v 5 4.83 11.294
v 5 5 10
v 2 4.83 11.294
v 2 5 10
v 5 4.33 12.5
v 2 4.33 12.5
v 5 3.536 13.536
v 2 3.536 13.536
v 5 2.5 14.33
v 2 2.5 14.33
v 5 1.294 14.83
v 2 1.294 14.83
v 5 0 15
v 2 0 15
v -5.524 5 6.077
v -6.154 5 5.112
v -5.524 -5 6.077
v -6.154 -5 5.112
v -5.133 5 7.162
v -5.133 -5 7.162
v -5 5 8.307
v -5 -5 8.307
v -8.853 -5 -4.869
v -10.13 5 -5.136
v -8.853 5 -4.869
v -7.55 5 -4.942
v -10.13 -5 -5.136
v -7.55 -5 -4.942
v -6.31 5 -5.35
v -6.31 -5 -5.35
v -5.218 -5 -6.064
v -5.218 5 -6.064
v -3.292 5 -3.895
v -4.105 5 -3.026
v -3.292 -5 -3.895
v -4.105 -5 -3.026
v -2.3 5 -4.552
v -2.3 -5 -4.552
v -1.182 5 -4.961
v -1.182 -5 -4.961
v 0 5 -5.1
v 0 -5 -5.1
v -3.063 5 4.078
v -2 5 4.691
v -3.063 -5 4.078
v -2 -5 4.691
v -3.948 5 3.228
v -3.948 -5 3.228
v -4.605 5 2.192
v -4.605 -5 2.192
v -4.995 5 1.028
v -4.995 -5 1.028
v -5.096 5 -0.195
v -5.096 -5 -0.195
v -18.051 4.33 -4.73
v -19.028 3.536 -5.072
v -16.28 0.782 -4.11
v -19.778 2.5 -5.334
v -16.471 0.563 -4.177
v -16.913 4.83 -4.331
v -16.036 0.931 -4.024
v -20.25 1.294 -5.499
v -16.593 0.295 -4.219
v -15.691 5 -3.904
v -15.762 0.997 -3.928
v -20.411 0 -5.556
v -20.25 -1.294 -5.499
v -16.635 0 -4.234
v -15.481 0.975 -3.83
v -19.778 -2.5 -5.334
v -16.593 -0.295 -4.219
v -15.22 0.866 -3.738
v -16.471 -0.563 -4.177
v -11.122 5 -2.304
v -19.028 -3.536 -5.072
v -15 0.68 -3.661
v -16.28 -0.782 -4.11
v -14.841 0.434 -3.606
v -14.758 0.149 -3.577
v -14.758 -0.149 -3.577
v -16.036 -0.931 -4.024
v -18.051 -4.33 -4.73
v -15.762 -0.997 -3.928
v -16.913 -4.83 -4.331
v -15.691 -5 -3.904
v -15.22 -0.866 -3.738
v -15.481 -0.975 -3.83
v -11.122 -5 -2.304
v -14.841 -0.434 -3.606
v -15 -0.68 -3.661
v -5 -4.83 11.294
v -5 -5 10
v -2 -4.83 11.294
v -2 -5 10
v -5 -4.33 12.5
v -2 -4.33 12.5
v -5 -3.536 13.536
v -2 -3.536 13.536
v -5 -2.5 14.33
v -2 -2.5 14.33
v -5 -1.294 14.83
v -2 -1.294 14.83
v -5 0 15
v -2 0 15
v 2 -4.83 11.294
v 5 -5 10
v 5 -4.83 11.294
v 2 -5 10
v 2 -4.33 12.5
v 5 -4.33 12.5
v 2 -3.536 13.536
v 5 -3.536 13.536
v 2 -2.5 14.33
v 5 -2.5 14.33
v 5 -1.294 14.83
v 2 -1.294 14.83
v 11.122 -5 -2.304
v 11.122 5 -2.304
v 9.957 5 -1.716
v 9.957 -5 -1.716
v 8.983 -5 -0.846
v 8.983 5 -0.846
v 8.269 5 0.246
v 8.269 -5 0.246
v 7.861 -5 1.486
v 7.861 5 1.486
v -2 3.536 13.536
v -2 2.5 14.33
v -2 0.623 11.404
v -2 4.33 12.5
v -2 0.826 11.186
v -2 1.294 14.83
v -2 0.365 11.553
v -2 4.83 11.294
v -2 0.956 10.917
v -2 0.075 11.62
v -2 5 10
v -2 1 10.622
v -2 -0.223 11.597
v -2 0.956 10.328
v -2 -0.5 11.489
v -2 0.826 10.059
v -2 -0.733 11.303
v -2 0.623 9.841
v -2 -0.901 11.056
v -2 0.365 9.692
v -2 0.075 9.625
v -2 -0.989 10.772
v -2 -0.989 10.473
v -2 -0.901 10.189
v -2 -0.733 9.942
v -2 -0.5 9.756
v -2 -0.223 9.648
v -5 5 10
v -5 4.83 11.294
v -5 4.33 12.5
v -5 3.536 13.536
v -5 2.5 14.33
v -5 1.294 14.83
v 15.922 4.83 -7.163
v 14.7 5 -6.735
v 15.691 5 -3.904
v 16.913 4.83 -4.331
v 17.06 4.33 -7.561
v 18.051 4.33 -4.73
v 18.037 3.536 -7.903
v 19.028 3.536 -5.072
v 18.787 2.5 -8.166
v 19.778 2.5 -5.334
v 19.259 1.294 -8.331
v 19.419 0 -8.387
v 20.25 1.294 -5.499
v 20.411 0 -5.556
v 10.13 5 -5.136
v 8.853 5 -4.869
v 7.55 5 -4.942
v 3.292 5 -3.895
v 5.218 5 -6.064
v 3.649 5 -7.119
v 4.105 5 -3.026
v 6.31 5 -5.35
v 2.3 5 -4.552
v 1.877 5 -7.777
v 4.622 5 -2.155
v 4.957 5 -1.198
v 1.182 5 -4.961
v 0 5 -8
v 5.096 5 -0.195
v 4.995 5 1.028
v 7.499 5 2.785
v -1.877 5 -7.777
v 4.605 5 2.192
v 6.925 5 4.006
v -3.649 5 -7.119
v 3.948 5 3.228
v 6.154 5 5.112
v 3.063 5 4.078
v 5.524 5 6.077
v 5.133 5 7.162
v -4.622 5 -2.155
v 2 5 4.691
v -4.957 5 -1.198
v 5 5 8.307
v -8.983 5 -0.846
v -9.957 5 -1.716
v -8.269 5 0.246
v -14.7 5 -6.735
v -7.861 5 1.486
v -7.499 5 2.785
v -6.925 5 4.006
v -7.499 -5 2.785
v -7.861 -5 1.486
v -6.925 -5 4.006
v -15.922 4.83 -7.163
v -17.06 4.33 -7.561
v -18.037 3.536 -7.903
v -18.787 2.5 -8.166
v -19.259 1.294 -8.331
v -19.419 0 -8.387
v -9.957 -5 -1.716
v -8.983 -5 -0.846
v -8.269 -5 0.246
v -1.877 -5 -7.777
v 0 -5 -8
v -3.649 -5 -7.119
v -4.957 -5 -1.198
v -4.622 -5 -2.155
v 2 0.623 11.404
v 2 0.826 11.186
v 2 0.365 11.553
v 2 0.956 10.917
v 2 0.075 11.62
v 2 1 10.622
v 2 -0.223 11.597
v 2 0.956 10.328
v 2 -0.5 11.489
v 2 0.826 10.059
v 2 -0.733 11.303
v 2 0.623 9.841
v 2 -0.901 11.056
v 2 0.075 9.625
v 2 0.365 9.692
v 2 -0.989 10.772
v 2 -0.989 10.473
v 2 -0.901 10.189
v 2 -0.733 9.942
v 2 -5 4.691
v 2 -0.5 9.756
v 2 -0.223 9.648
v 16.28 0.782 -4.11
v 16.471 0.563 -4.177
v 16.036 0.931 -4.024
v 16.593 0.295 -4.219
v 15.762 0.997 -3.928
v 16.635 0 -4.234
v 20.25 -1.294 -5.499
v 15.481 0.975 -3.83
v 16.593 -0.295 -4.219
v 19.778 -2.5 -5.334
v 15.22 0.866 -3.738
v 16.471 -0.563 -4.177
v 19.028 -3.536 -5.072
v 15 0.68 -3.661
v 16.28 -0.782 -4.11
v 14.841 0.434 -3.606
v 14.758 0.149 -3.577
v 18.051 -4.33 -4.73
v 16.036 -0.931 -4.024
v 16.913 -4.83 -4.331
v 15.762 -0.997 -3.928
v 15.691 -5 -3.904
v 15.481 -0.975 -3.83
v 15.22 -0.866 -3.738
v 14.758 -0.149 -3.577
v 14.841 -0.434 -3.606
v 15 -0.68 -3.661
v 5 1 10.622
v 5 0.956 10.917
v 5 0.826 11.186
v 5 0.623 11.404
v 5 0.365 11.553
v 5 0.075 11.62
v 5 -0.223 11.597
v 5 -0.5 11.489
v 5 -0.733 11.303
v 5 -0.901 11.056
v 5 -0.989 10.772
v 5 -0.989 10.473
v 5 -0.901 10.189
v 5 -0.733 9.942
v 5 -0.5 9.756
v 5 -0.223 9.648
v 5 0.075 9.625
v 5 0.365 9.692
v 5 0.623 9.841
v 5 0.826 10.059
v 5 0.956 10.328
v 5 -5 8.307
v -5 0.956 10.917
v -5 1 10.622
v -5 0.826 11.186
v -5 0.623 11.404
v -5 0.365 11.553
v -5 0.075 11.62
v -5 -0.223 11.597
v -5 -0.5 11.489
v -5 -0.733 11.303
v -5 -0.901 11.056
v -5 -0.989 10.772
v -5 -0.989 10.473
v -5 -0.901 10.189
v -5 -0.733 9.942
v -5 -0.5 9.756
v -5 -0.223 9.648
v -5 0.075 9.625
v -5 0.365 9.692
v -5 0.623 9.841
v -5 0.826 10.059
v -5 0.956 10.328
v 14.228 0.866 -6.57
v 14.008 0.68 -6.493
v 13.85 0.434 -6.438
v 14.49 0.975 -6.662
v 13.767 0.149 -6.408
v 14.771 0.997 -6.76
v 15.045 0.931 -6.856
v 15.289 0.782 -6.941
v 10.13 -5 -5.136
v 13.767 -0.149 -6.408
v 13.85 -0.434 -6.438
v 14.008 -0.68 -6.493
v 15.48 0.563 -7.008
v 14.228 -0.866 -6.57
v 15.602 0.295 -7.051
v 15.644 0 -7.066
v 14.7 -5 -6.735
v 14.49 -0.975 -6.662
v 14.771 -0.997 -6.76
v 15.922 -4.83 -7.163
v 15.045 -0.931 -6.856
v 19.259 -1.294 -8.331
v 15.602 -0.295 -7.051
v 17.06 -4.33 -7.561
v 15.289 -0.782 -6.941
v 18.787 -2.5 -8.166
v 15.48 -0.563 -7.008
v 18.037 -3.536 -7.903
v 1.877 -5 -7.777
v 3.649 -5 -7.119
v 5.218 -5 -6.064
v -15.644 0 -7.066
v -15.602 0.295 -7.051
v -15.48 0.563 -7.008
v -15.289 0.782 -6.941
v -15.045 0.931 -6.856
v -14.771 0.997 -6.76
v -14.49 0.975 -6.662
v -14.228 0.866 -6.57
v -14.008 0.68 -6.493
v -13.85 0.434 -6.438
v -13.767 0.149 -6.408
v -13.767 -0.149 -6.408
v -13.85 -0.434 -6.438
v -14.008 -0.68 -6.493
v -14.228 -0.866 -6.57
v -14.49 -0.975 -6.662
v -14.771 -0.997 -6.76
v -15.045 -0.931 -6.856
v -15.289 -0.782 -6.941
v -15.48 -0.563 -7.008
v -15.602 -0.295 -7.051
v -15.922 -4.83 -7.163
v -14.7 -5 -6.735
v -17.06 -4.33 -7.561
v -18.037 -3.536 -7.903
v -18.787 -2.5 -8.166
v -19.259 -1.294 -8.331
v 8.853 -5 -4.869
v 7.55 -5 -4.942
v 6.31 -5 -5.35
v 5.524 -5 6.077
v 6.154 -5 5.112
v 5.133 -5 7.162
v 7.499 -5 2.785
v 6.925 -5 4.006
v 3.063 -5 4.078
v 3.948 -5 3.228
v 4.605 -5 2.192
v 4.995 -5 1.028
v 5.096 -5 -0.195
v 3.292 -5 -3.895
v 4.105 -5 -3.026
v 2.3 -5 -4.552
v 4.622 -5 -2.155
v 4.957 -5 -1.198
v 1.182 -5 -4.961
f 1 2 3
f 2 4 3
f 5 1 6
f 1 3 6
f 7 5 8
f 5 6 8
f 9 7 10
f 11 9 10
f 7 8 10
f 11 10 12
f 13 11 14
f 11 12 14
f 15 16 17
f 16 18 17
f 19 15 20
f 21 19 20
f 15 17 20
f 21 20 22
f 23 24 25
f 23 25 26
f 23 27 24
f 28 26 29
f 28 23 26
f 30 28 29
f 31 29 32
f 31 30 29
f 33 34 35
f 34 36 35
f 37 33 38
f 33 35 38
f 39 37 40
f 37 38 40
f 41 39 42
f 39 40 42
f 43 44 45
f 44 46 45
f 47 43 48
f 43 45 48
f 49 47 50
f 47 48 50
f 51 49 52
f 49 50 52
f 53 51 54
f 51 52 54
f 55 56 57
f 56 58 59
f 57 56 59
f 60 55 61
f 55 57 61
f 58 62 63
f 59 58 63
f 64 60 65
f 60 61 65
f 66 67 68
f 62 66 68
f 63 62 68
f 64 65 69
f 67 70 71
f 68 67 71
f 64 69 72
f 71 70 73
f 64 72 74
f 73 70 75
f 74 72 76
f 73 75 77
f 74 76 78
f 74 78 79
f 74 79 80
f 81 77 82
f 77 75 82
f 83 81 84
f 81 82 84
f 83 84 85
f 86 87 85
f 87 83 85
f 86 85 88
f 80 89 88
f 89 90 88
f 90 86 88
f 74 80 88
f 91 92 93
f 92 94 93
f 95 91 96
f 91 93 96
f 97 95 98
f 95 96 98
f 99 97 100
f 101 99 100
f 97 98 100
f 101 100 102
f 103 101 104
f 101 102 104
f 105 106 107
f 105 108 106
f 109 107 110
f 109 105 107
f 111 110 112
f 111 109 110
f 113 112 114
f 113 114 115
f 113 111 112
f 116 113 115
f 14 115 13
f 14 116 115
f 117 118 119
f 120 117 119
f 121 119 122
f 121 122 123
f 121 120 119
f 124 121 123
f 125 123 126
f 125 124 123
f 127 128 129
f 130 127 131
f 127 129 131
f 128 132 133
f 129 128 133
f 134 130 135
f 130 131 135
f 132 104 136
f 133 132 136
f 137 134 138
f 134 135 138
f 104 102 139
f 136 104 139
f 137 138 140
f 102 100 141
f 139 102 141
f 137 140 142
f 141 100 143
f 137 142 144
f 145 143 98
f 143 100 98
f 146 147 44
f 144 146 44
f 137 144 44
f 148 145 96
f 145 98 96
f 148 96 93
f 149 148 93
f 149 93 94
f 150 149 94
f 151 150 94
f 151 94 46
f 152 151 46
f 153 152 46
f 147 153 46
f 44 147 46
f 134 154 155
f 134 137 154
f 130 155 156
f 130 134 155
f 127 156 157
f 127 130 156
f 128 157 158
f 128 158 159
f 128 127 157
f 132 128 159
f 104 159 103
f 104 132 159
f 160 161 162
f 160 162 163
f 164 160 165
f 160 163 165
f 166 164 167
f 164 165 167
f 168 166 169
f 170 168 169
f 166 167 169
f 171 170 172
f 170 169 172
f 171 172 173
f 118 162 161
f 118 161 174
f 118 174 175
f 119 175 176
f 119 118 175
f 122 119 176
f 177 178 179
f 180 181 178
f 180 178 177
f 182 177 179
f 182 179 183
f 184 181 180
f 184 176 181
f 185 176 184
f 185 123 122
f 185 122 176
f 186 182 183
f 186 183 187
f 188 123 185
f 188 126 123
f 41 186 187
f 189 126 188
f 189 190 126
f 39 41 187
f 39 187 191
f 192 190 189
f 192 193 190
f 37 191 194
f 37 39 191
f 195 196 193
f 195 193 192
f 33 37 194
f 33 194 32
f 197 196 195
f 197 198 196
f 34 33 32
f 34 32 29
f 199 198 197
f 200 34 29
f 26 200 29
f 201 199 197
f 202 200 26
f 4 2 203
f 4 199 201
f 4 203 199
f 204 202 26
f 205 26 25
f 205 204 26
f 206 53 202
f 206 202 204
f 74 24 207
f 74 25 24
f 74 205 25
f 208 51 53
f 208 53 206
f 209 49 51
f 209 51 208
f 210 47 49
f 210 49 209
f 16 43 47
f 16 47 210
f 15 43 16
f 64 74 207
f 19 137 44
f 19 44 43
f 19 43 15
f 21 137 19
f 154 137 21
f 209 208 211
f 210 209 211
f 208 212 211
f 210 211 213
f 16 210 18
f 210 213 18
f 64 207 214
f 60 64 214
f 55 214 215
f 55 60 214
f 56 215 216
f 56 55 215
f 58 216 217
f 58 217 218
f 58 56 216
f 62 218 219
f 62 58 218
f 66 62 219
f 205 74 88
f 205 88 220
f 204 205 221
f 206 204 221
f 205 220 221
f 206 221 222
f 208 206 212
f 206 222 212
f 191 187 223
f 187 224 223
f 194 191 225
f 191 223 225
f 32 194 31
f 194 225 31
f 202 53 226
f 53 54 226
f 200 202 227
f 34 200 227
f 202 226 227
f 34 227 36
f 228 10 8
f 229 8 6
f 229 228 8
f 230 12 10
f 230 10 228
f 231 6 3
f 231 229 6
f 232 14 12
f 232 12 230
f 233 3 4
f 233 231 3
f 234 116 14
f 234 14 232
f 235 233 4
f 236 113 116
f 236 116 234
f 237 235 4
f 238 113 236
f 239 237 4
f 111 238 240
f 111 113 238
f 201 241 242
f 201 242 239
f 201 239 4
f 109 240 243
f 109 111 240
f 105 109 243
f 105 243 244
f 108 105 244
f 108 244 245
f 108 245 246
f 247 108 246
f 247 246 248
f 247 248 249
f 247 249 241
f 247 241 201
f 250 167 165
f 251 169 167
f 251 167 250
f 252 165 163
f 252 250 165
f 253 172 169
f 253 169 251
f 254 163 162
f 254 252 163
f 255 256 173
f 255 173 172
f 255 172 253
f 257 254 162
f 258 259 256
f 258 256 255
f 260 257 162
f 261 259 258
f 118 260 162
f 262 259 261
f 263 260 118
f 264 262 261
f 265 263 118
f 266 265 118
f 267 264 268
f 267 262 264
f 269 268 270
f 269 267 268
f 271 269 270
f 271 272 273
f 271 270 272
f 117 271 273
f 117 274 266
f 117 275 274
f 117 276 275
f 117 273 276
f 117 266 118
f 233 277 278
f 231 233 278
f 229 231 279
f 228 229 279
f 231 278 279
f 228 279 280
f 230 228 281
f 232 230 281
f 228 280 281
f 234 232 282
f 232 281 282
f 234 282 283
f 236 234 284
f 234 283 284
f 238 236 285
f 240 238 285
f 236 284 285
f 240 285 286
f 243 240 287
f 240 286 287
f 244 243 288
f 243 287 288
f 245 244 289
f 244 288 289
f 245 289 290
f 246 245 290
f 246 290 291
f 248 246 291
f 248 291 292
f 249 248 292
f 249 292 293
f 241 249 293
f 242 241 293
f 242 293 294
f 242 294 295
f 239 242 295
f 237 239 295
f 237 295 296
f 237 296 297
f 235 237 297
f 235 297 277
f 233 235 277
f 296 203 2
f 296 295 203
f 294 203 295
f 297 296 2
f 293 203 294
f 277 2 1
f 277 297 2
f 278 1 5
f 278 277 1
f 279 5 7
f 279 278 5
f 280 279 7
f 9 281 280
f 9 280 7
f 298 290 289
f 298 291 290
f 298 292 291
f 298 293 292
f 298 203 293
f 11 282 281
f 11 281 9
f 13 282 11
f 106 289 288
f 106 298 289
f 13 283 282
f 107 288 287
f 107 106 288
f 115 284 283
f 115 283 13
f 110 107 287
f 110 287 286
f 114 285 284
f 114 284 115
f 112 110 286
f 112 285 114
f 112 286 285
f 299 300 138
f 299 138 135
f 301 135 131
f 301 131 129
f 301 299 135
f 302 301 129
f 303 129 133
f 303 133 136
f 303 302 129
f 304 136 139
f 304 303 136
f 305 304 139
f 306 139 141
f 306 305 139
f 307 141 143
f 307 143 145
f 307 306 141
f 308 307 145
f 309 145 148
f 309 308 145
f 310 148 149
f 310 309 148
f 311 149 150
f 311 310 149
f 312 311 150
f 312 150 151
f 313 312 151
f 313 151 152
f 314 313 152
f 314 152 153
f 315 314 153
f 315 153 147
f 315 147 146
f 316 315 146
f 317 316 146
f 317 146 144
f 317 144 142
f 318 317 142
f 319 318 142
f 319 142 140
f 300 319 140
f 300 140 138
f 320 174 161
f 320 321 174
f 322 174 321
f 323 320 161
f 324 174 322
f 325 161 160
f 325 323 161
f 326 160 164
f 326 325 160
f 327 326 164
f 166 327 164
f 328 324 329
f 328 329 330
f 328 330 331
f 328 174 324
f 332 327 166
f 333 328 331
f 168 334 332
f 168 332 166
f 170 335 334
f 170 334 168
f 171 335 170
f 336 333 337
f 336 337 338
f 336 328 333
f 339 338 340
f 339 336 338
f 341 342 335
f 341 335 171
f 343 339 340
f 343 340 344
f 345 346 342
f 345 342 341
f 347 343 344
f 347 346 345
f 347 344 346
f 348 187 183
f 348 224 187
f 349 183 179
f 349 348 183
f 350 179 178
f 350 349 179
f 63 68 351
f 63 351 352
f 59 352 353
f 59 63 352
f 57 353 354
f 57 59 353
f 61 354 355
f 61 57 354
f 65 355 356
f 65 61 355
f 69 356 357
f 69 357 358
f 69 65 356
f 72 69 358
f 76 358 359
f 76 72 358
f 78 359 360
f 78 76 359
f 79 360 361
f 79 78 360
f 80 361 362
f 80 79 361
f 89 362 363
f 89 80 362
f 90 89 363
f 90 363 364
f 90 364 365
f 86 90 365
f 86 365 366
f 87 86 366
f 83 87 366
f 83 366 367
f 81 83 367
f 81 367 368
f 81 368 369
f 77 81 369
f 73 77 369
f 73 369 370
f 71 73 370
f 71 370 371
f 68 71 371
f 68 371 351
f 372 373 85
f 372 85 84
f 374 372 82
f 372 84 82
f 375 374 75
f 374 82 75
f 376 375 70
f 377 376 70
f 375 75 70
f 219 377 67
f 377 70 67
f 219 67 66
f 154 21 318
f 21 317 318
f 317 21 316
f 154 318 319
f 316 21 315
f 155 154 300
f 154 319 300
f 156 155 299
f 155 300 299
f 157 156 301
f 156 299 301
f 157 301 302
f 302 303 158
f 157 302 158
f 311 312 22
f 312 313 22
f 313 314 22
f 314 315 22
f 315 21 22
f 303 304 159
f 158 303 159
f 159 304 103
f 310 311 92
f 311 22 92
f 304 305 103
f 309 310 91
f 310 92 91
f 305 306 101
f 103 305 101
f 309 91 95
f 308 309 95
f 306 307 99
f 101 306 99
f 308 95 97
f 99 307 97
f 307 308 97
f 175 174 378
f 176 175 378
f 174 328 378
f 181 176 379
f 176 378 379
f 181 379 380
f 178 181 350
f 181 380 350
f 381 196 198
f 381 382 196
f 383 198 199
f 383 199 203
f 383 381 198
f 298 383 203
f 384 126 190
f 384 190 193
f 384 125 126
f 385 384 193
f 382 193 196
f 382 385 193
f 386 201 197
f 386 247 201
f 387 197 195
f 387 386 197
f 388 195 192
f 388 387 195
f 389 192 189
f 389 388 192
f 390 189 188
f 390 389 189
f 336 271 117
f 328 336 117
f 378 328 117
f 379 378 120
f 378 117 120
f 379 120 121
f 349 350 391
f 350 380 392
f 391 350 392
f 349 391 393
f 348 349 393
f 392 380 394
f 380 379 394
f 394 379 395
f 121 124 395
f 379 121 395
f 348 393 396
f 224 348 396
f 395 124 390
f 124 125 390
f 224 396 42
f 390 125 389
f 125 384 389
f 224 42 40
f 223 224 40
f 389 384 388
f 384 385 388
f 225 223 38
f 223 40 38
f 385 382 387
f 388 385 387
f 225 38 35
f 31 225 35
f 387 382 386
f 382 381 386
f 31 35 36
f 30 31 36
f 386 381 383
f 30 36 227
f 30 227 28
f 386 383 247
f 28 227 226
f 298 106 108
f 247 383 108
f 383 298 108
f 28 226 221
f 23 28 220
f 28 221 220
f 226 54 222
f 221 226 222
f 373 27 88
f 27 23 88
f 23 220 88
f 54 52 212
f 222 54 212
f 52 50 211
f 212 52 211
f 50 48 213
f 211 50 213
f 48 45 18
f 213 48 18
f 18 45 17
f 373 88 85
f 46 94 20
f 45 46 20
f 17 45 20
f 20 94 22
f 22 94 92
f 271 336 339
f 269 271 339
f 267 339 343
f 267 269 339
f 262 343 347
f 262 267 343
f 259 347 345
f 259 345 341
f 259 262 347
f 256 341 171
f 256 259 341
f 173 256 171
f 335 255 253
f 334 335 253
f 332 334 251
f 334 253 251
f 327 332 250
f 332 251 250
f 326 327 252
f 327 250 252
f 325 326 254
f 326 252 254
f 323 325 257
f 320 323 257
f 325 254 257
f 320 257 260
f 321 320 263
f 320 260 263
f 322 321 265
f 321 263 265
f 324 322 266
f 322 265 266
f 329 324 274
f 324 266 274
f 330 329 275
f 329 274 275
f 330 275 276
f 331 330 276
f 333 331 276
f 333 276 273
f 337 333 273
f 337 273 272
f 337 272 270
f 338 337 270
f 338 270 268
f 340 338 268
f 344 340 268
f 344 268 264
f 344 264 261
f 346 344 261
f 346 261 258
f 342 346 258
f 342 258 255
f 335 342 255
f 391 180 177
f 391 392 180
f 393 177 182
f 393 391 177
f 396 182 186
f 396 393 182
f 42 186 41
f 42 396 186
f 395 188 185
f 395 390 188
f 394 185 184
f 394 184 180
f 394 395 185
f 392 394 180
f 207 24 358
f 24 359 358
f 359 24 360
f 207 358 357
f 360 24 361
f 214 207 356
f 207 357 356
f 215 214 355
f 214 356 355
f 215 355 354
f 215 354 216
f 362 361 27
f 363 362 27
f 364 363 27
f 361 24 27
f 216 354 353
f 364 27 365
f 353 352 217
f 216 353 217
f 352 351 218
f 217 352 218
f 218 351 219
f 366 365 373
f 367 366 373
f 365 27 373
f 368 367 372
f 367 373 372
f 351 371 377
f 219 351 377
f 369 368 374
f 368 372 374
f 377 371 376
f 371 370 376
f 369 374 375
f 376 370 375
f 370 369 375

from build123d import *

# Parameters (mm, degrees)
F1_DEPTH = 5
F2_R     = 1
F3_DEPTH = 25
F4_R     = 1
F5_DEPTH = 25
F6_R     = 4.99999
F7_R     = 5


# Not quite as in the source:
# - a fillet or chamfer is up to 0.001 mm smaller than in the source, because OpenCascade refuses the exact size
# - a feature names something its author has since deleted; it is built from what else it names


with BuildPart() as f1:
    # F0 (on Front) → F1 (new body, symmetric)
    with BuildSketch(Plane.XZ):
        with BuildLine():
            ThreePointArc((4.105083276, -3.0262668912), (2.2995694004, -4.5521402189), (0, -5.1))
            Line((0, -5.1), (0, -8))
            ThreePointArc((0, -8), (3.9939571451, -6.9316885622), (6.9212167652, -4.0120765807))
            Line((6.9212167652, -4.0120765807), (4.105083276, -3.0262668912))
        make_face()
        with BuildLine():
            ThreePointArc((5.0962805256, -0.1947429178), (4.8135907549, -1.6850353244), (4.105083276, -3.0262668912))
            Line((4.105083276, -3.0262668912), (6.9212167652, -4.0120765807))
            ThreePointArc((6.9212167652, -4.0120765807), (7.5507305959, -2.6431926657), (7.9124140148, -1.1805526072))
            Line((7.9124140148, -1.1805526072), (5.0962805256, -0.1947429178))
        make_face()
        with BuildLine():
            ThreePointArc((2, 4.6914816423), (4.3079109714, 2.7298174046), (5.0962805256, -0.1947429178))
            Line((5.0962805256, -0.1947429178), (7.9124140148, -1.1805526072))
            ThreePointArc((7.9124140148, -1.1805526072), (7.4476378384, 2.9210769638), (5, 6.2449979984))
            ThreePointArc((5, 6.2449979984), (3.5795567819, 7.1544932207), (2, 7.7459666924))
            Line((2, 7.7459666924), (2, 4.6914816423))
        make_face()
        with BuildLine():
            ThreePointArc((7.9124140148, -1.1805526072), (7.5507305959, -2.6431926657), (6.9212167652, -4.0120765807))
            Line((6.9212167652, -4.0120765807), (19.4194533219, -8.3871826424))
            Line((19.4194533219, -8.3871826424), (20.4106505716, -5.555658669))
            Line((20.4106505716, -5.555658669), (7.9124140148, -1.1805526072))
        make_face()
        with BuildLine():
            Line((2, 15), (2, 7.7459666924))
            ThreePointArc((2, 7.7459666924), (3.5795567819, 7.1544932207), (5, 6.2449979984))
            Line((5, 6.2449979984), (5, 15))
            Line((5, 15), (2, 15))
        make_face()
    extrude(amount=F1_DEPTH, both=True)

    # F2 (on face) → F3 (cut)
    with BuildSketch(Plane(origin=(0.4955986248, 0, 1.4157619867), x_dir=(0.9438413245, 0, -0.3303990832), z_dir=(0.3303990832, 0, 0.9438413245))):
        with Locations((16.1, 0)):
            Circle(F2_R)
    extrude(amount=-F3_DEPTH, mode=Mode.SUBTRACT)

    # F4 (on face) → F5 (cut)
    with BuildSketch(Plane.YZ.offset(5)):
        with Locations((0, 10.6224989992)):
            Circle(F4_R)
    extrude(amount=-F5_DEPTH, mode=Mode.SUBTRACT)

    # F6 (radius 5 in the source; OpenCascade refuses exactly that, so slightly less here)
    f6_edges = [f1.edges().sort_by_distance(p)[0] for p in [
        (19.915052, 5, -6.971421),
        (19.915052, -5, -6.971421),
        (3.5, -5, 15),
        (3.5, 5, 15),
    ]]
    fillet(f6_edges, radius=F6_R)

    # F7
    f7_edges = [f1.edges().sort_by_distance(p)[0] for p in [
        (5, 0, 6.244998),
        (7.912414, 0, -1.180553),
        (6.921217, 0, -4.012077),
    ]]
    fillet(f7_edges, radius=F7_R)

    # F8: F1 across plane


with BuildPart() as f1_1:
    add(f1.part)
    add(f1.part.mirror(Plane.YZ))


solid = f1_1.part
